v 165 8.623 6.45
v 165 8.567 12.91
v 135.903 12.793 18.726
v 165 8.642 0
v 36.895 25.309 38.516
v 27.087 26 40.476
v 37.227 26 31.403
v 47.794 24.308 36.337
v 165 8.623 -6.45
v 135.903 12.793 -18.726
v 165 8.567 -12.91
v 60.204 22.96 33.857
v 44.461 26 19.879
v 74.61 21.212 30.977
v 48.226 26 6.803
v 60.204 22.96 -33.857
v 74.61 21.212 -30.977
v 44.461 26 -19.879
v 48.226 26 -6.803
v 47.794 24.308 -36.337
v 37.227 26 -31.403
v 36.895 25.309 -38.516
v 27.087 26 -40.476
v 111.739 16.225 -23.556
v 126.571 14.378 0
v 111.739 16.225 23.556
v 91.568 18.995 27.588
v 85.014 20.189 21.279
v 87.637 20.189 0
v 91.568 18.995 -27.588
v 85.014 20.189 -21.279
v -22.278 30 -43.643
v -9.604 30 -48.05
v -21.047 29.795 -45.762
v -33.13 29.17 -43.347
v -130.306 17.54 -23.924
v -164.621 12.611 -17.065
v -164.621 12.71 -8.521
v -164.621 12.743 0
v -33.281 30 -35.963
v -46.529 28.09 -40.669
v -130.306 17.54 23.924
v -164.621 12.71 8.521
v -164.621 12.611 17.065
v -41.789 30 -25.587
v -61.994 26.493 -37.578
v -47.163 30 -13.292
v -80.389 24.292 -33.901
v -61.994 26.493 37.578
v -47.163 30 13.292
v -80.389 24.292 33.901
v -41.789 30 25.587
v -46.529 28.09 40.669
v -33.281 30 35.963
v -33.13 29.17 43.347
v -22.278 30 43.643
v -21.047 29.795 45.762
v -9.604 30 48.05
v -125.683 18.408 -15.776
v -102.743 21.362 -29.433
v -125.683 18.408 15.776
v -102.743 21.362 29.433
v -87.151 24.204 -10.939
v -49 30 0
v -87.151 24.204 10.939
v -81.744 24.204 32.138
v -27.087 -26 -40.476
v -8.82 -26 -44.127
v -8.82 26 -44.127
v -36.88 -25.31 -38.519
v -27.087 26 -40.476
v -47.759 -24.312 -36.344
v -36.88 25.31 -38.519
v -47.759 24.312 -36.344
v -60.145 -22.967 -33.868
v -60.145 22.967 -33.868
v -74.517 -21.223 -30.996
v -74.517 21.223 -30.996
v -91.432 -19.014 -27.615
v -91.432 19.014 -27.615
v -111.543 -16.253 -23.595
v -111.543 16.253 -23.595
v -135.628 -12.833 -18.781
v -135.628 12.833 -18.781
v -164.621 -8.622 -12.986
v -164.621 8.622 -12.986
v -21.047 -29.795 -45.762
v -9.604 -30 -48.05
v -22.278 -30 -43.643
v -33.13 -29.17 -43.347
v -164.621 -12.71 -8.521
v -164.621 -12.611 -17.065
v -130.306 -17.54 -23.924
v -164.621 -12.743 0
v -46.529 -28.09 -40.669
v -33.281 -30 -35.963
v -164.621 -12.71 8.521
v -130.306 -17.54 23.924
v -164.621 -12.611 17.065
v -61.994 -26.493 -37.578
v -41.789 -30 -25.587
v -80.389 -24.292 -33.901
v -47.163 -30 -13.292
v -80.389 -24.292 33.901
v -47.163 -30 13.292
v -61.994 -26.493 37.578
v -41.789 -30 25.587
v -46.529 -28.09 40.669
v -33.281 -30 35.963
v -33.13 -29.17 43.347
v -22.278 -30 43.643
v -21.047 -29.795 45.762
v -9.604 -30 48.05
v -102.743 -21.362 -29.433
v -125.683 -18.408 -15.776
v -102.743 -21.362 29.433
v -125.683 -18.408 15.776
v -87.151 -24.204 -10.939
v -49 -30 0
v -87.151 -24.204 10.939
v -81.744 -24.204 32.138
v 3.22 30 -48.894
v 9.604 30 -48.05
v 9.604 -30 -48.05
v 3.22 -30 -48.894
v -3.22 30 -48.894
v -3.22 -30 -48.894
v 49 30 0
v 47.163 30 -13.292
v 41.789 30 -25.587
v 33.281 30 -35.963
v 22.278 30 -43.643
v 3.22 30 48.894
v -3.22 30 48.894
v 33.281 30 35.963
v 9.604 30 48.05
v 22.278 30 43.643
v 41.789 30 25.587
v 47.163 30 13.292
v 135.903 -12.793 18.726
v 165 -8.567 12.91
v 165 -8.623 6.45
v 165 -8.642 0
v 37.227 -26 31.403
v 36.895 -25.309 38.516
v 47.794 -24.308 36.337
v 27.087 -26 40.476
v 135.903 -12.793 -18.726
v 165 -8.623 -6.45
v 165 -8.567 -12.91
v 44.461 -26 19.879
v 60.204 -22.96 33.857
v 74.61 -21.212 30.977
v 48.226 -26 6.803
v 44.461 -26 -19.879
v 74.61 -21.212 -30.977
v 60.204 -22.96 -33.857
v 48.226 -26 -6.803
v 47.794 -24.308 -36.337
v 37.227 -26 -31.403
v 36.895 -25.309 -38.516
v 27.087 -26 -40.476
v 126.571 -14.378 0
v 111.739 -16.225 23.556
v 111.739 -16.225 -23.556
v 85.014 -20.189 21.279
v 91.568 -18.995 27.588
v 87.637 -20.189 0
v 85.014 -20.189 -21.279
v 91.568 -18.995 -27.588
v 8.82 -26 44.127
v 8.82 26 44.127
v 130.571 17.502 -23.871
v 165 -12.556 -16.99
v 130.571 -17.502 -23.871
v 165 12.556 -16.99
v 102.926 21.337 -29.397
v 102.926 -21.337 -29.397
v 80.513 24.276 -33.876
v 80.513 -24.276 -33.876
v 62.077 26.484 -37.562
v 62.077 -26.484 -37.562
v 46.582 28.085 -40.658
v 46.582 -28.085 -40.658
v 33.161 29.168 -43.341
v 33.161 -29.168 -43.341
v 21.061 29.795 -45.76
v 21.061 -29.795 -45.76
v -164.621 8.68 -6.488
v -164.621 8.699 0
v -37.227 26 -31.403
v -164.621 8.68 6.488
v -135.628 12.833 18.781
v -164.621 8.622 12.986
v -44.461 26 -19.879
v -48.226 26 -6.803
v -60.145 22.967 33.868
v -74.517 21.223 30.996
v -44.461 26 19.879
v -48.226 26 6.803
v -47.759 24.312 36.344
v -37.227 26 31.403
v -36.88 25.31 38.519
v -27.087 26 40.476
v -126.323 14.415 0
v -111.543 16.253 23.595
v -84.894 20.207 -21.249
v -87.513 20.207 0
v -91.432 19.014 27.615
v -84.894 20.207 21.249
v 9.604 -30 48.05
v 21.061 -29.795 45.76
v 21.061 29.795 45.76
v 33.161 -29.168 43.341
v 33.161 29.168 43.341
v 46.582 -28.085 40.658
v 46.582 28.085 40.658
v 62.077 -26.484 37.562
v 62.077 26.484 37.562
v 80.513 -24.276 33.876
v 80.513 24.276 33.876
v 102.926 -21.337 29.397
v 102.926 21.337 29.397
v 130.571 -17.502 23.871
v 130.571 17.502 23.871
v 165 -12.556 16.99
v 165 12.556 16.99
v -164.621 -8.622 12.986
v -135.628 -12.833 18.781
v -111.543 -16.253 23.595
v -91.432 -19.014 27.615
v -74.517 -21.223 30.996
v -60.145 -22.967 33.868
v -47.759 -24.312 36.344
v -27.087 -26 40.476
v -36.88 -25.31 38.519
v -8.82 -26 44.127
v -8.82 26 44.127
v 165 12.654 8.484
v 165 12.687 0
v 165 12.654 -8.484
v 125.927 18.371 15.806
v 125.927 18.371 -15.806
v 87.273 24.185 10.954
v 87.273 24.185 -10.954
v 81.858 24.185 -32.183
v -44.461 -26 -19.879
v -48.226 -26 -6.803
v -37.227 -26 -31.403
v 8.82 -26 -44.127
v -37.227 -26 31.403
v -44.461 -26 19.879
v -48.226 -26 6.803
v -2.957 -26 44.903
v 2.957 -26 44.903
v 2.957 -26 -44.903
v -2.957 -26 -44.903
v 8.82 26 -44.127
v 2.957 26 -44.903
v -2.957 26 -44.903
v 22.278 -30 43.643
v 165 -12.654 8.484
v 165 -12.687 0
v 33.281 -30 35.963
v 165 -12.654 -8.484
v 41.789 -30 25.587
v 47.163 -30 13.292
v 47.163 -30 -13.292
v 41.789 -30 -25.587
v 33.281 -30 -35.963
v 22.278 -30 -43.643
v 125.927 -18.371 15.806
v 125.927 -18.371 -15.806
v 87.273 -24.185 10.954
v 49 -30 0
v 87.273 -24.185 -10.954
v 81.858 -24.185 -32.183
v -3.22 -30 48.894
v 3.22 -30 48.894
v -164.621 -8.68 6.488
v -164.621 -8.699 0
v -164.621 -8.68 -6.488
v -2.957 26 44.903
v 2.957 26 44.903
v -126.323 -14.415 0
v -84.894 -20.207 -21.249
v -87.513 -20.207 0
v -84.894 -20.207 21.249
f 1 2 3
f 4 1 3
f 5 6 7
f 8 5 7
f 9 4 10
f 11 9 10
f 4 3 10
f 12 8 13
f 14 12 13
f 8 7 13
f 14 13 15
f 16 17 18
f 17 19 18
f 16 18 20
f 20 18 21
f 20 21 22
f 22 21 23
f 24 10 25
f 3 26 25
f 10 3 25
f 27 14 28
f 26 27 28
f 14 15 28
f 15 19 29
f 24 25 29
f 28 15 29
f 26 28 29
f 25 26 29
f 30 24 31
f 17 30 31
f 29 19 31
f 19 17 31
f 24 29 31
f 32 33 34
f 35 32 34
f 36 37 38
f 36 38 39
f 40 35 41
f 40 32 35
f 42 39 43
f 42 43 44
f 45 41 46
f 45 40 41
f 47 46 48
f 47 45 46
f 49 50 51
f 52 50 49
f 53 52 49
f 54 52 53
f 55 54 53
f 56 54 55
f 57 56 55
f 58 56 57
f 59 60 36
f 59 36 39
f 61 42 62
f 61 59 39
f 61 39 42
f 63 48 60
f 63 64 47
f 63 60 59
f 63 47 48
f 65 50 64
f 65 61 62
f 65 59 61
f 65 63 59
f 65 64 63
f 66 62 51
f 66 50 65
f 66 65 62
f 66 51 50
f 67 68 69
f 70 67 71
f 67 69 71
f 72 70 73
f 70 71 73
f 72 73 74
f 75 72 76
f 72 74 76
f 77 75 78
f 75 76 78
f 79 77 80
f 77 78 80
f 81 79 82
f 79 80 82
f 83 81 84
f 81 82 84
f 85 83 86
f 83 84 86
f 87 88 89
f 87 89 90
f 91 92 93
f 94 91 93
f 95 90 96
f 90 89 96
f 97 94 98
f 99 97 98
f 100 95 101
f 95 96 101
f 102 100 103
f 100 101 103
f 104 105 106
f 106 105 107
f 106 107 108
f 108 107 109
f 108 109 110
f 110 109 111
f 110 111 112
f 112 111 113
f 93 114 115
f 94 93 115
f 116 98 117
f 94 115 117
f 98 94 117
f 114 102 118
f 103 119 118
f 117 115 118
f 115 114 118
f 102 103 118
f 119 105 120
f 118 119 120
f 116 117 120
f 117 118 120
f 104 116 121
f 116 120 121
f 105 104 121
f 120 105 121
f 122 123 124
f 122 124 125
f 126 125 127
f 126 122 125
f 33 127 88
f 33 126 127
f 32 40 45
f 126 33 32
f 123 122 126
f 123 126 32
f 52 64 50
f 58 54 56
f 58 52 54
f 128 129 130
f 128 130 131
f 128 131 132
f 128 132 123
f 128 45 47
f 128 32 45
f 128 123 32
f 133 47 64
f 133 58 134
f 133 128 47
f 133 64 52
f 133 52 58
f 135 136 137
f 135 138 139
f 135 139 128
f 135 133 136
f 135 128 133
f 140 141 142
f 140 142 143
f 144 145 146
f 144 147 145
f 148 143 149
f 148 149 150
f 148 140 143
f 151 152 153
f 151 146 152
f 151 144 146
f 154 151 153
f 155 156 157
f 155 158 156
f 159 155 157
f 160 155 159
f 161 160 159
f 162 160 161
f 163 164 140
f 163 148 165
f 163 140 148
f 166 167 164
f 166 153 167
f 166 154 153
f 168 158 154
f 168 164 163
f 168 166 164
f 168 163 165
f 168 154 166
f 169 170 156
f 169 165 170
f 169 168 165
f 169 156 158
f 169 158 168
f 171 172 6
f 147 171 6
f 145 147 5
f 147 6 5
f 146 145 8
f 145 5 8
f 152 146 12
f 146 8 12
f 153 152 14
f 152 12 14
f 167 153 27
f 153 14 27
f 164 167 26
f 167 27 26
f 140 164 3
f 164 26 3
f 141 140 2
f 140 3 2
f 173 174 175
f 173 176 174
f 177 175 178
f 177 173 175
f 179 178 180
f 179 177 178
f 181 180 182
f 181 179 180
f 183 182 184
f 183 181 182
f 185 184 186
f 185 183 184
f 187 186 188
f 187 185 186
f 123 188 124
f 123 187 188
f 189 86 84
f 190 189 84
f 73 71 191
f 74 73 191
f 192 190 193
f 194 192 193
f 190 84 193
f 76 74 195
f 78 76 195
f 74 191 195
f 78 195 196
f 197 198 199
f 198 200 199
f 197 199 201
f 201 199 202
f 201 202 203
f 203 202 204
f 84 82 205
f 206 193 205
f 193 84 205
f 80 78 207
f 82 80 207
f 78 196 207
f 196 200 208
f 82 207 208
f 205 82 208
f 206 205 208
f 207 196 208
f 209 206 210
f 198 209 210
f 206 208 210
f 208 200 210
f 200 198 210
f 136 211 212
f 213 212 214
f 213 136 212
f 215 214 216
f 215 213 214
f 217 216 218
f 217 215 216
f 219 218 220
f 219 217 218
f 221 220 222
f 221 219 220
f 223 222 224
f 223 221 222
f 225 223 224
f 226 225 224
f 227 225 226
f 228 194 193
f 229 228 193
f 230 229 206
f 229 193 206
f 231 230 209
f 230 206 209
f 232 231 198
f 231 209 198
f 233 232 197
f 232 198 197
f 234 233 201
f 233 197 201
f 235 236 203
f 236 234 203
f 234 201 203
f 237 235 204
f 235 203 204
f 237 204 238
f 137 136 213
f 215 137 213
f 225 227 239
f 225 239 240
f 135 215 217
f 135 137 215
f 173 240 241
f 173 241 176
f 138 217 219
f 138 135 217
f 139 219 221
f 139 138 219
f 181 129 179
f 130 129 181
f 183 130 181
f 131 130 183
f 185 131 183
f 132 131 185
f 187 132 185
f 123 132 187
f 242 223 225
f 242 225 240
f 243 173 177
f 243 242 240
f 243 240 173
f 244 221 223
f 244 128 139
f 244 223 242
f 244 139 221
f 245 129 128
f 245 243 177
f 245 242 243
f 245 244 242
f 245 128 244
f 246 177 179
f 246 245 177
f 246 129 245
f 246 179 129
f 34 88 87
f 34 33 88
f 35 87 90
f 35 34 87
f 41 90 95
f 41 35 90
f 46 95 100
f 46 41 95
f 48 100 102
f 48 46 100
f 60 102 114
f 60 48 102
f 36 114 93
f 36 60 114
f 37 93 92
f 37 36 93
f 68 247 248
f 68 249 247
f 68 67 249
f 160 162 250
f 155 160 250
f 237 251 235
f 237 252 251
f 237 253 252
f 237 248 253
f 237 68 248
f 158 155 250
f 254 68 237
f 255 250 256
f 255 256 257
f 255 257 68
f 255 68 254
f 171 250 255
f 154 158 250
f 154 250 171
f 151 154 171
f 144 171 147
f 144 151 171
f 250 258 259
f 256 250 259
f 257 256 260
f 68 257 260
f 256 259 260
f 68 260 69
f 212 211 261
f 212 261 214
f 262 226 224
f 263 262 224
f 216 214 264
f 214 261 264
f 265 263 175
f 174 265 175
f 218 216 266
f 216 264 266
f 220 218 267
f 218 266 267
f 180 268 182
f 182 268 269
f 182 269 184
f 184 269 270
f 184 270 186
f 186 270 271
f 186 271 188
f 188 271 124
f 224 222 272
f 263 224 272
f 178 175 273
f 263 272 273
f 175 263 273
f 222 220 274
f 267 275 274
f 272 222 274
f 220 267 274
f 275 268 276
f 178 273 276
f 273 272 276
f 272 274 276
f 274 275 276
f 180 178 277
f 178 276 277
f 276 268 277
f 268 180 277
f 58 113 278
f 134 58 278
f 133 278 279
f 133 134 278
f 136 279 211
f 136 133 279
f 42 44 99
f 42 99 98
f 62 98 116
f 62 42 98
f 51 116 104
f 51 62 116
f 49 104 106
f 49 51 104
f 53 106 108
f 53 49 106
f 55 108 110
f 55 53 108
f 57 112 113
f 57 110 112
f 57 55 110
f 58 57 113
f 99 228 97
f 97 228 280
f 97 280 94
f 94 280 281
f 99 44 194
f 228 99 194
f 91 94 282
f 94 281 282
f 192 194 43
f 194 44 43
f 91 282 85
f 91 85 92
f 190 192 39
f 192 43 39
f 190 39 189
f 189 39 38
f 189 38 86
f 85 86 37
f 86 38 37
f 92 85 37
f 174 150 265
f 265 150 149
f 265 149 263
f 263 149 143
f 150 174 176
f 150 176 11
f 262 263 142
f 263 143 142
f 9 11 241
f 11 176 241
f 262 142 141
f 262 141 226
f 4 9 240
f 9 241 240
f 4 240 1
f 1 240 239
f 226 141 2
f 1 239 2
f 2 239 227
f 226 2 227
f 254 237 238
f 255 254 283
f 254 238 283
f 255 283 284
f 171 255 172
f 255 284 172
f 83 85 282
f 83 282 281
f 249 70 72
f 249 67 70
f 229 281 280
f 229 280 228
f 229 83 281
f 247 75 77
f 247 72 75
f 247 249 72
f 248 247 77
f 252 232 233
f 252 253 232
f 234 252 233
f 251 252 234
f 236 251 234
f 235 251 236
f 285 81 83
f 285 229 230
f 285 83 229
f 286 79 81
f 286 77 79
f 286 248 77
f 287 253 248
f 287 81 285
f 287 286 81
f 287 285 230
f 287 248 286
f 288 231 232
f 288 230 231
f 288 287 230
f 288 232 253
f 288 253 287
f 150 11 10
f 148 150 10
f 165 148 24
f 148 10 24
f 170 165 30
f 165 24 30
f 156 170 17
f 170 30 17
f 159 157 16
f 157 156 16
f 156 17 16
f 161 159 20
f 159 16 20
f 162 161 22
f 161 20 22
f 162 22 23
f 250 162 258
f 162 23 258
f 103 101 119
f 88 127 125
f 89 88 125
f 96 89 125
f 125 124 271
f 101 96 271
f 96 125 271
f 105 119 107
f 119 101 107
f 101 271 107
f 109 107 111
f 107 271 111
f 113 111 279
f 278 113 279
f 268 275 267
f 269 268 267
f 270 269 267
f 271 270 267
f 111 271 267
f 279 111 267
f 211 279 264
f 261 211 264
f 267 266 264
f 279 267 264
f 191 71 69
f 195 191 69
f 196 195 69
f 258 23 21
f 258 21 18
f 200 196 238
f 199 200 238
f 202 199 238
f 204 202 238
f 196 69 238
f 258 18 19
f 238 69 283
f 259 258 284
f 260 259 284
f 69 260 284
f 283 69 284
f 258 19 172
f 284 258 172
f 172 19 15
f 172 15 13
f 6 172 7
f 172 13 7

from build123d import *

# Parameters (mm, degrees)
SKETCH_1_R               = 49
EXTRUDE_1_DEPTH          = 30
SKETCH_16_R              = 250
SKETCH_16_5_R            = 250
SKETCH_14_OUTSIDE_W      = 643.93
SKETCH_14_OUTSIDE_H      = 643.93
CUT_EXTRUDE_1_DEPTH      = 355.823900134
CUT_EXTRUDE_1_DEPTH_BACK = 355.823900134
SHELL_1_T                = 4
SKETCH_15_OUTSIDE_W      = 604.606
SKETCH_15_OUTSIDE_H      = 202.606
CUT_EXTRUDE_2_DEPTH      = 257.517055963
CUT_EXTRUDE_2_DEPTH_BACK = 257.517055963


with BuildPart() as part:
    # 草图1 → 凸台-拉伸1 (new, symmetric)
    with BuildSketch(Plane(origin=(0, 0, 0), x_dir=(1, 0, 0), z_dir=(0, 1, 0))):
        with Locations(Location((0, 0, 0), (0, 0, 270))):
            Circle(SKETCH_1_R)
    extrude(amount=EXTRUDE_1_DEPTH, both=True)

    # 草图16 → section 0 of loft_1
    with BuildSketch(Plane(origin=(0, 0, 0), x_dir=(1, 0, 0), z_dir=(0, 1, 0)), mode=Mode.PRIVATE) as loft_1_s0:
        Circle(SKETCH_16_R)
    # loft up to a face of the part (loft_1)
    loft([loft_1_s0.sketch, Face(Wire([part.edges().sort_by_distance((35.719462744, 30, -33.542808191))[0]]))])

    # 草图16<5> → section 0 of loft_3
    with BuildSketch(Plane(origin=(0, 0, 0), x_dir=(1, 0, 0), z_dir=(0, 1, 0)), mode=Mode.PRIVATE) as loft_3_s0:
        Circle(SKETCH_16_5_R)
    # loft up to a face of the part (loft_3)
    loft([loft_3_s0.sketch, Face(Wire([part.edges().sort_by_distance((-35.719462744, -30, -33.542808191))[0]]))])

    # 草图14 outside → 切除-拉伸1 (cut, two sides)
    with BuildSketch(Plane(origin=(0, 0, 0), x_dir=(1, 0, 0), z_dir=(0, 1, 0))) as cut_extrude_1_sk:
        Rectangle(SKETCH_14_OUTSIDE_W, SKETCH_14_OUTSIDE_H)
        with BuildLine():
            Line((-250, 0), (-9.604, -48.049590883))
            ThreePointArc((-9.604, -48.049590883), (0, -49), (9.604, -48.049590883))
            Line((9.604, -48.049590883), (250, 0))
            Line((250, 0), (9.604, 48.049590883))
            ThreePointArc((9.604, 48.049590883), (1.6e-08, 49), (-9.603999968, 48.049590889))
            Line((-9.603999968, 48.049590889), (-250, 0))
        make_face(mode=Mode.SUBTRACT)
    extrude(amount=CUT_EXTRUDE_1_DEPTH, mode=Mode.SUBTRACT)
    extrude(cut_extrude_1_sk.sketch, amount=-CUT_EXTRUDE_1_DEPTH_BACK, mode=Mode.SUBTRACT)

    # 抽壳1 (no face opened: a closed hollow body)
    add(offset(amount=-SHELL_1_T, mode=Mode.PRIVATE), mode=Mode.SUBTRACT)

    # 草图15 outside → 切除-拉伸2 (cut, two sides)
    with BuildSketch(Plane(origin=(0, 0, 0), x_dir=(1, 0, 0), z_dir=(0, 1, 0))) as cut_extrude_2_sk:
        Rectangle(SKETCH_15_OUTSIDE_W, SKETCH_15_OUTSIDE_H)
        with BuildLine():
            Line((-9.60400022, -48.049590839), (-164.621347882, -17.065214498))
            Line((-164.621347882, -17.065214498), (-164.621347882, 17.065214498))
            Line((-164.621347882, 17.065214498), (-9.604, 48.049590883))
            ThreePointArc((-9.604, 48.049590883), (0, 49), (9.604, 48.049590883))
            Line((9.604, 48.049590883), (165, 16.989530712))
            Line((165, 16.989530712), (165, -16.989530712))
            Line((165, -16.989530712), (9.604, -48.049590883))
            ThreePointArc((9.604, -48.049590883), (-1.12e-07, -49), (-9.60400022, -48.049590839))
        make_face(mode=Mode.SUBTRACT)
    extrude(amount=CUT_EXTRUDE_2_DEPTH, mode=Mode.SUBTRACT)
    extrude(cut_extrude_2_sk.sketch, amount=-CUT_EXTRUDE_2_DEPTH_BACK, mode=Mode.SUBTRACT)


solid = part.part
